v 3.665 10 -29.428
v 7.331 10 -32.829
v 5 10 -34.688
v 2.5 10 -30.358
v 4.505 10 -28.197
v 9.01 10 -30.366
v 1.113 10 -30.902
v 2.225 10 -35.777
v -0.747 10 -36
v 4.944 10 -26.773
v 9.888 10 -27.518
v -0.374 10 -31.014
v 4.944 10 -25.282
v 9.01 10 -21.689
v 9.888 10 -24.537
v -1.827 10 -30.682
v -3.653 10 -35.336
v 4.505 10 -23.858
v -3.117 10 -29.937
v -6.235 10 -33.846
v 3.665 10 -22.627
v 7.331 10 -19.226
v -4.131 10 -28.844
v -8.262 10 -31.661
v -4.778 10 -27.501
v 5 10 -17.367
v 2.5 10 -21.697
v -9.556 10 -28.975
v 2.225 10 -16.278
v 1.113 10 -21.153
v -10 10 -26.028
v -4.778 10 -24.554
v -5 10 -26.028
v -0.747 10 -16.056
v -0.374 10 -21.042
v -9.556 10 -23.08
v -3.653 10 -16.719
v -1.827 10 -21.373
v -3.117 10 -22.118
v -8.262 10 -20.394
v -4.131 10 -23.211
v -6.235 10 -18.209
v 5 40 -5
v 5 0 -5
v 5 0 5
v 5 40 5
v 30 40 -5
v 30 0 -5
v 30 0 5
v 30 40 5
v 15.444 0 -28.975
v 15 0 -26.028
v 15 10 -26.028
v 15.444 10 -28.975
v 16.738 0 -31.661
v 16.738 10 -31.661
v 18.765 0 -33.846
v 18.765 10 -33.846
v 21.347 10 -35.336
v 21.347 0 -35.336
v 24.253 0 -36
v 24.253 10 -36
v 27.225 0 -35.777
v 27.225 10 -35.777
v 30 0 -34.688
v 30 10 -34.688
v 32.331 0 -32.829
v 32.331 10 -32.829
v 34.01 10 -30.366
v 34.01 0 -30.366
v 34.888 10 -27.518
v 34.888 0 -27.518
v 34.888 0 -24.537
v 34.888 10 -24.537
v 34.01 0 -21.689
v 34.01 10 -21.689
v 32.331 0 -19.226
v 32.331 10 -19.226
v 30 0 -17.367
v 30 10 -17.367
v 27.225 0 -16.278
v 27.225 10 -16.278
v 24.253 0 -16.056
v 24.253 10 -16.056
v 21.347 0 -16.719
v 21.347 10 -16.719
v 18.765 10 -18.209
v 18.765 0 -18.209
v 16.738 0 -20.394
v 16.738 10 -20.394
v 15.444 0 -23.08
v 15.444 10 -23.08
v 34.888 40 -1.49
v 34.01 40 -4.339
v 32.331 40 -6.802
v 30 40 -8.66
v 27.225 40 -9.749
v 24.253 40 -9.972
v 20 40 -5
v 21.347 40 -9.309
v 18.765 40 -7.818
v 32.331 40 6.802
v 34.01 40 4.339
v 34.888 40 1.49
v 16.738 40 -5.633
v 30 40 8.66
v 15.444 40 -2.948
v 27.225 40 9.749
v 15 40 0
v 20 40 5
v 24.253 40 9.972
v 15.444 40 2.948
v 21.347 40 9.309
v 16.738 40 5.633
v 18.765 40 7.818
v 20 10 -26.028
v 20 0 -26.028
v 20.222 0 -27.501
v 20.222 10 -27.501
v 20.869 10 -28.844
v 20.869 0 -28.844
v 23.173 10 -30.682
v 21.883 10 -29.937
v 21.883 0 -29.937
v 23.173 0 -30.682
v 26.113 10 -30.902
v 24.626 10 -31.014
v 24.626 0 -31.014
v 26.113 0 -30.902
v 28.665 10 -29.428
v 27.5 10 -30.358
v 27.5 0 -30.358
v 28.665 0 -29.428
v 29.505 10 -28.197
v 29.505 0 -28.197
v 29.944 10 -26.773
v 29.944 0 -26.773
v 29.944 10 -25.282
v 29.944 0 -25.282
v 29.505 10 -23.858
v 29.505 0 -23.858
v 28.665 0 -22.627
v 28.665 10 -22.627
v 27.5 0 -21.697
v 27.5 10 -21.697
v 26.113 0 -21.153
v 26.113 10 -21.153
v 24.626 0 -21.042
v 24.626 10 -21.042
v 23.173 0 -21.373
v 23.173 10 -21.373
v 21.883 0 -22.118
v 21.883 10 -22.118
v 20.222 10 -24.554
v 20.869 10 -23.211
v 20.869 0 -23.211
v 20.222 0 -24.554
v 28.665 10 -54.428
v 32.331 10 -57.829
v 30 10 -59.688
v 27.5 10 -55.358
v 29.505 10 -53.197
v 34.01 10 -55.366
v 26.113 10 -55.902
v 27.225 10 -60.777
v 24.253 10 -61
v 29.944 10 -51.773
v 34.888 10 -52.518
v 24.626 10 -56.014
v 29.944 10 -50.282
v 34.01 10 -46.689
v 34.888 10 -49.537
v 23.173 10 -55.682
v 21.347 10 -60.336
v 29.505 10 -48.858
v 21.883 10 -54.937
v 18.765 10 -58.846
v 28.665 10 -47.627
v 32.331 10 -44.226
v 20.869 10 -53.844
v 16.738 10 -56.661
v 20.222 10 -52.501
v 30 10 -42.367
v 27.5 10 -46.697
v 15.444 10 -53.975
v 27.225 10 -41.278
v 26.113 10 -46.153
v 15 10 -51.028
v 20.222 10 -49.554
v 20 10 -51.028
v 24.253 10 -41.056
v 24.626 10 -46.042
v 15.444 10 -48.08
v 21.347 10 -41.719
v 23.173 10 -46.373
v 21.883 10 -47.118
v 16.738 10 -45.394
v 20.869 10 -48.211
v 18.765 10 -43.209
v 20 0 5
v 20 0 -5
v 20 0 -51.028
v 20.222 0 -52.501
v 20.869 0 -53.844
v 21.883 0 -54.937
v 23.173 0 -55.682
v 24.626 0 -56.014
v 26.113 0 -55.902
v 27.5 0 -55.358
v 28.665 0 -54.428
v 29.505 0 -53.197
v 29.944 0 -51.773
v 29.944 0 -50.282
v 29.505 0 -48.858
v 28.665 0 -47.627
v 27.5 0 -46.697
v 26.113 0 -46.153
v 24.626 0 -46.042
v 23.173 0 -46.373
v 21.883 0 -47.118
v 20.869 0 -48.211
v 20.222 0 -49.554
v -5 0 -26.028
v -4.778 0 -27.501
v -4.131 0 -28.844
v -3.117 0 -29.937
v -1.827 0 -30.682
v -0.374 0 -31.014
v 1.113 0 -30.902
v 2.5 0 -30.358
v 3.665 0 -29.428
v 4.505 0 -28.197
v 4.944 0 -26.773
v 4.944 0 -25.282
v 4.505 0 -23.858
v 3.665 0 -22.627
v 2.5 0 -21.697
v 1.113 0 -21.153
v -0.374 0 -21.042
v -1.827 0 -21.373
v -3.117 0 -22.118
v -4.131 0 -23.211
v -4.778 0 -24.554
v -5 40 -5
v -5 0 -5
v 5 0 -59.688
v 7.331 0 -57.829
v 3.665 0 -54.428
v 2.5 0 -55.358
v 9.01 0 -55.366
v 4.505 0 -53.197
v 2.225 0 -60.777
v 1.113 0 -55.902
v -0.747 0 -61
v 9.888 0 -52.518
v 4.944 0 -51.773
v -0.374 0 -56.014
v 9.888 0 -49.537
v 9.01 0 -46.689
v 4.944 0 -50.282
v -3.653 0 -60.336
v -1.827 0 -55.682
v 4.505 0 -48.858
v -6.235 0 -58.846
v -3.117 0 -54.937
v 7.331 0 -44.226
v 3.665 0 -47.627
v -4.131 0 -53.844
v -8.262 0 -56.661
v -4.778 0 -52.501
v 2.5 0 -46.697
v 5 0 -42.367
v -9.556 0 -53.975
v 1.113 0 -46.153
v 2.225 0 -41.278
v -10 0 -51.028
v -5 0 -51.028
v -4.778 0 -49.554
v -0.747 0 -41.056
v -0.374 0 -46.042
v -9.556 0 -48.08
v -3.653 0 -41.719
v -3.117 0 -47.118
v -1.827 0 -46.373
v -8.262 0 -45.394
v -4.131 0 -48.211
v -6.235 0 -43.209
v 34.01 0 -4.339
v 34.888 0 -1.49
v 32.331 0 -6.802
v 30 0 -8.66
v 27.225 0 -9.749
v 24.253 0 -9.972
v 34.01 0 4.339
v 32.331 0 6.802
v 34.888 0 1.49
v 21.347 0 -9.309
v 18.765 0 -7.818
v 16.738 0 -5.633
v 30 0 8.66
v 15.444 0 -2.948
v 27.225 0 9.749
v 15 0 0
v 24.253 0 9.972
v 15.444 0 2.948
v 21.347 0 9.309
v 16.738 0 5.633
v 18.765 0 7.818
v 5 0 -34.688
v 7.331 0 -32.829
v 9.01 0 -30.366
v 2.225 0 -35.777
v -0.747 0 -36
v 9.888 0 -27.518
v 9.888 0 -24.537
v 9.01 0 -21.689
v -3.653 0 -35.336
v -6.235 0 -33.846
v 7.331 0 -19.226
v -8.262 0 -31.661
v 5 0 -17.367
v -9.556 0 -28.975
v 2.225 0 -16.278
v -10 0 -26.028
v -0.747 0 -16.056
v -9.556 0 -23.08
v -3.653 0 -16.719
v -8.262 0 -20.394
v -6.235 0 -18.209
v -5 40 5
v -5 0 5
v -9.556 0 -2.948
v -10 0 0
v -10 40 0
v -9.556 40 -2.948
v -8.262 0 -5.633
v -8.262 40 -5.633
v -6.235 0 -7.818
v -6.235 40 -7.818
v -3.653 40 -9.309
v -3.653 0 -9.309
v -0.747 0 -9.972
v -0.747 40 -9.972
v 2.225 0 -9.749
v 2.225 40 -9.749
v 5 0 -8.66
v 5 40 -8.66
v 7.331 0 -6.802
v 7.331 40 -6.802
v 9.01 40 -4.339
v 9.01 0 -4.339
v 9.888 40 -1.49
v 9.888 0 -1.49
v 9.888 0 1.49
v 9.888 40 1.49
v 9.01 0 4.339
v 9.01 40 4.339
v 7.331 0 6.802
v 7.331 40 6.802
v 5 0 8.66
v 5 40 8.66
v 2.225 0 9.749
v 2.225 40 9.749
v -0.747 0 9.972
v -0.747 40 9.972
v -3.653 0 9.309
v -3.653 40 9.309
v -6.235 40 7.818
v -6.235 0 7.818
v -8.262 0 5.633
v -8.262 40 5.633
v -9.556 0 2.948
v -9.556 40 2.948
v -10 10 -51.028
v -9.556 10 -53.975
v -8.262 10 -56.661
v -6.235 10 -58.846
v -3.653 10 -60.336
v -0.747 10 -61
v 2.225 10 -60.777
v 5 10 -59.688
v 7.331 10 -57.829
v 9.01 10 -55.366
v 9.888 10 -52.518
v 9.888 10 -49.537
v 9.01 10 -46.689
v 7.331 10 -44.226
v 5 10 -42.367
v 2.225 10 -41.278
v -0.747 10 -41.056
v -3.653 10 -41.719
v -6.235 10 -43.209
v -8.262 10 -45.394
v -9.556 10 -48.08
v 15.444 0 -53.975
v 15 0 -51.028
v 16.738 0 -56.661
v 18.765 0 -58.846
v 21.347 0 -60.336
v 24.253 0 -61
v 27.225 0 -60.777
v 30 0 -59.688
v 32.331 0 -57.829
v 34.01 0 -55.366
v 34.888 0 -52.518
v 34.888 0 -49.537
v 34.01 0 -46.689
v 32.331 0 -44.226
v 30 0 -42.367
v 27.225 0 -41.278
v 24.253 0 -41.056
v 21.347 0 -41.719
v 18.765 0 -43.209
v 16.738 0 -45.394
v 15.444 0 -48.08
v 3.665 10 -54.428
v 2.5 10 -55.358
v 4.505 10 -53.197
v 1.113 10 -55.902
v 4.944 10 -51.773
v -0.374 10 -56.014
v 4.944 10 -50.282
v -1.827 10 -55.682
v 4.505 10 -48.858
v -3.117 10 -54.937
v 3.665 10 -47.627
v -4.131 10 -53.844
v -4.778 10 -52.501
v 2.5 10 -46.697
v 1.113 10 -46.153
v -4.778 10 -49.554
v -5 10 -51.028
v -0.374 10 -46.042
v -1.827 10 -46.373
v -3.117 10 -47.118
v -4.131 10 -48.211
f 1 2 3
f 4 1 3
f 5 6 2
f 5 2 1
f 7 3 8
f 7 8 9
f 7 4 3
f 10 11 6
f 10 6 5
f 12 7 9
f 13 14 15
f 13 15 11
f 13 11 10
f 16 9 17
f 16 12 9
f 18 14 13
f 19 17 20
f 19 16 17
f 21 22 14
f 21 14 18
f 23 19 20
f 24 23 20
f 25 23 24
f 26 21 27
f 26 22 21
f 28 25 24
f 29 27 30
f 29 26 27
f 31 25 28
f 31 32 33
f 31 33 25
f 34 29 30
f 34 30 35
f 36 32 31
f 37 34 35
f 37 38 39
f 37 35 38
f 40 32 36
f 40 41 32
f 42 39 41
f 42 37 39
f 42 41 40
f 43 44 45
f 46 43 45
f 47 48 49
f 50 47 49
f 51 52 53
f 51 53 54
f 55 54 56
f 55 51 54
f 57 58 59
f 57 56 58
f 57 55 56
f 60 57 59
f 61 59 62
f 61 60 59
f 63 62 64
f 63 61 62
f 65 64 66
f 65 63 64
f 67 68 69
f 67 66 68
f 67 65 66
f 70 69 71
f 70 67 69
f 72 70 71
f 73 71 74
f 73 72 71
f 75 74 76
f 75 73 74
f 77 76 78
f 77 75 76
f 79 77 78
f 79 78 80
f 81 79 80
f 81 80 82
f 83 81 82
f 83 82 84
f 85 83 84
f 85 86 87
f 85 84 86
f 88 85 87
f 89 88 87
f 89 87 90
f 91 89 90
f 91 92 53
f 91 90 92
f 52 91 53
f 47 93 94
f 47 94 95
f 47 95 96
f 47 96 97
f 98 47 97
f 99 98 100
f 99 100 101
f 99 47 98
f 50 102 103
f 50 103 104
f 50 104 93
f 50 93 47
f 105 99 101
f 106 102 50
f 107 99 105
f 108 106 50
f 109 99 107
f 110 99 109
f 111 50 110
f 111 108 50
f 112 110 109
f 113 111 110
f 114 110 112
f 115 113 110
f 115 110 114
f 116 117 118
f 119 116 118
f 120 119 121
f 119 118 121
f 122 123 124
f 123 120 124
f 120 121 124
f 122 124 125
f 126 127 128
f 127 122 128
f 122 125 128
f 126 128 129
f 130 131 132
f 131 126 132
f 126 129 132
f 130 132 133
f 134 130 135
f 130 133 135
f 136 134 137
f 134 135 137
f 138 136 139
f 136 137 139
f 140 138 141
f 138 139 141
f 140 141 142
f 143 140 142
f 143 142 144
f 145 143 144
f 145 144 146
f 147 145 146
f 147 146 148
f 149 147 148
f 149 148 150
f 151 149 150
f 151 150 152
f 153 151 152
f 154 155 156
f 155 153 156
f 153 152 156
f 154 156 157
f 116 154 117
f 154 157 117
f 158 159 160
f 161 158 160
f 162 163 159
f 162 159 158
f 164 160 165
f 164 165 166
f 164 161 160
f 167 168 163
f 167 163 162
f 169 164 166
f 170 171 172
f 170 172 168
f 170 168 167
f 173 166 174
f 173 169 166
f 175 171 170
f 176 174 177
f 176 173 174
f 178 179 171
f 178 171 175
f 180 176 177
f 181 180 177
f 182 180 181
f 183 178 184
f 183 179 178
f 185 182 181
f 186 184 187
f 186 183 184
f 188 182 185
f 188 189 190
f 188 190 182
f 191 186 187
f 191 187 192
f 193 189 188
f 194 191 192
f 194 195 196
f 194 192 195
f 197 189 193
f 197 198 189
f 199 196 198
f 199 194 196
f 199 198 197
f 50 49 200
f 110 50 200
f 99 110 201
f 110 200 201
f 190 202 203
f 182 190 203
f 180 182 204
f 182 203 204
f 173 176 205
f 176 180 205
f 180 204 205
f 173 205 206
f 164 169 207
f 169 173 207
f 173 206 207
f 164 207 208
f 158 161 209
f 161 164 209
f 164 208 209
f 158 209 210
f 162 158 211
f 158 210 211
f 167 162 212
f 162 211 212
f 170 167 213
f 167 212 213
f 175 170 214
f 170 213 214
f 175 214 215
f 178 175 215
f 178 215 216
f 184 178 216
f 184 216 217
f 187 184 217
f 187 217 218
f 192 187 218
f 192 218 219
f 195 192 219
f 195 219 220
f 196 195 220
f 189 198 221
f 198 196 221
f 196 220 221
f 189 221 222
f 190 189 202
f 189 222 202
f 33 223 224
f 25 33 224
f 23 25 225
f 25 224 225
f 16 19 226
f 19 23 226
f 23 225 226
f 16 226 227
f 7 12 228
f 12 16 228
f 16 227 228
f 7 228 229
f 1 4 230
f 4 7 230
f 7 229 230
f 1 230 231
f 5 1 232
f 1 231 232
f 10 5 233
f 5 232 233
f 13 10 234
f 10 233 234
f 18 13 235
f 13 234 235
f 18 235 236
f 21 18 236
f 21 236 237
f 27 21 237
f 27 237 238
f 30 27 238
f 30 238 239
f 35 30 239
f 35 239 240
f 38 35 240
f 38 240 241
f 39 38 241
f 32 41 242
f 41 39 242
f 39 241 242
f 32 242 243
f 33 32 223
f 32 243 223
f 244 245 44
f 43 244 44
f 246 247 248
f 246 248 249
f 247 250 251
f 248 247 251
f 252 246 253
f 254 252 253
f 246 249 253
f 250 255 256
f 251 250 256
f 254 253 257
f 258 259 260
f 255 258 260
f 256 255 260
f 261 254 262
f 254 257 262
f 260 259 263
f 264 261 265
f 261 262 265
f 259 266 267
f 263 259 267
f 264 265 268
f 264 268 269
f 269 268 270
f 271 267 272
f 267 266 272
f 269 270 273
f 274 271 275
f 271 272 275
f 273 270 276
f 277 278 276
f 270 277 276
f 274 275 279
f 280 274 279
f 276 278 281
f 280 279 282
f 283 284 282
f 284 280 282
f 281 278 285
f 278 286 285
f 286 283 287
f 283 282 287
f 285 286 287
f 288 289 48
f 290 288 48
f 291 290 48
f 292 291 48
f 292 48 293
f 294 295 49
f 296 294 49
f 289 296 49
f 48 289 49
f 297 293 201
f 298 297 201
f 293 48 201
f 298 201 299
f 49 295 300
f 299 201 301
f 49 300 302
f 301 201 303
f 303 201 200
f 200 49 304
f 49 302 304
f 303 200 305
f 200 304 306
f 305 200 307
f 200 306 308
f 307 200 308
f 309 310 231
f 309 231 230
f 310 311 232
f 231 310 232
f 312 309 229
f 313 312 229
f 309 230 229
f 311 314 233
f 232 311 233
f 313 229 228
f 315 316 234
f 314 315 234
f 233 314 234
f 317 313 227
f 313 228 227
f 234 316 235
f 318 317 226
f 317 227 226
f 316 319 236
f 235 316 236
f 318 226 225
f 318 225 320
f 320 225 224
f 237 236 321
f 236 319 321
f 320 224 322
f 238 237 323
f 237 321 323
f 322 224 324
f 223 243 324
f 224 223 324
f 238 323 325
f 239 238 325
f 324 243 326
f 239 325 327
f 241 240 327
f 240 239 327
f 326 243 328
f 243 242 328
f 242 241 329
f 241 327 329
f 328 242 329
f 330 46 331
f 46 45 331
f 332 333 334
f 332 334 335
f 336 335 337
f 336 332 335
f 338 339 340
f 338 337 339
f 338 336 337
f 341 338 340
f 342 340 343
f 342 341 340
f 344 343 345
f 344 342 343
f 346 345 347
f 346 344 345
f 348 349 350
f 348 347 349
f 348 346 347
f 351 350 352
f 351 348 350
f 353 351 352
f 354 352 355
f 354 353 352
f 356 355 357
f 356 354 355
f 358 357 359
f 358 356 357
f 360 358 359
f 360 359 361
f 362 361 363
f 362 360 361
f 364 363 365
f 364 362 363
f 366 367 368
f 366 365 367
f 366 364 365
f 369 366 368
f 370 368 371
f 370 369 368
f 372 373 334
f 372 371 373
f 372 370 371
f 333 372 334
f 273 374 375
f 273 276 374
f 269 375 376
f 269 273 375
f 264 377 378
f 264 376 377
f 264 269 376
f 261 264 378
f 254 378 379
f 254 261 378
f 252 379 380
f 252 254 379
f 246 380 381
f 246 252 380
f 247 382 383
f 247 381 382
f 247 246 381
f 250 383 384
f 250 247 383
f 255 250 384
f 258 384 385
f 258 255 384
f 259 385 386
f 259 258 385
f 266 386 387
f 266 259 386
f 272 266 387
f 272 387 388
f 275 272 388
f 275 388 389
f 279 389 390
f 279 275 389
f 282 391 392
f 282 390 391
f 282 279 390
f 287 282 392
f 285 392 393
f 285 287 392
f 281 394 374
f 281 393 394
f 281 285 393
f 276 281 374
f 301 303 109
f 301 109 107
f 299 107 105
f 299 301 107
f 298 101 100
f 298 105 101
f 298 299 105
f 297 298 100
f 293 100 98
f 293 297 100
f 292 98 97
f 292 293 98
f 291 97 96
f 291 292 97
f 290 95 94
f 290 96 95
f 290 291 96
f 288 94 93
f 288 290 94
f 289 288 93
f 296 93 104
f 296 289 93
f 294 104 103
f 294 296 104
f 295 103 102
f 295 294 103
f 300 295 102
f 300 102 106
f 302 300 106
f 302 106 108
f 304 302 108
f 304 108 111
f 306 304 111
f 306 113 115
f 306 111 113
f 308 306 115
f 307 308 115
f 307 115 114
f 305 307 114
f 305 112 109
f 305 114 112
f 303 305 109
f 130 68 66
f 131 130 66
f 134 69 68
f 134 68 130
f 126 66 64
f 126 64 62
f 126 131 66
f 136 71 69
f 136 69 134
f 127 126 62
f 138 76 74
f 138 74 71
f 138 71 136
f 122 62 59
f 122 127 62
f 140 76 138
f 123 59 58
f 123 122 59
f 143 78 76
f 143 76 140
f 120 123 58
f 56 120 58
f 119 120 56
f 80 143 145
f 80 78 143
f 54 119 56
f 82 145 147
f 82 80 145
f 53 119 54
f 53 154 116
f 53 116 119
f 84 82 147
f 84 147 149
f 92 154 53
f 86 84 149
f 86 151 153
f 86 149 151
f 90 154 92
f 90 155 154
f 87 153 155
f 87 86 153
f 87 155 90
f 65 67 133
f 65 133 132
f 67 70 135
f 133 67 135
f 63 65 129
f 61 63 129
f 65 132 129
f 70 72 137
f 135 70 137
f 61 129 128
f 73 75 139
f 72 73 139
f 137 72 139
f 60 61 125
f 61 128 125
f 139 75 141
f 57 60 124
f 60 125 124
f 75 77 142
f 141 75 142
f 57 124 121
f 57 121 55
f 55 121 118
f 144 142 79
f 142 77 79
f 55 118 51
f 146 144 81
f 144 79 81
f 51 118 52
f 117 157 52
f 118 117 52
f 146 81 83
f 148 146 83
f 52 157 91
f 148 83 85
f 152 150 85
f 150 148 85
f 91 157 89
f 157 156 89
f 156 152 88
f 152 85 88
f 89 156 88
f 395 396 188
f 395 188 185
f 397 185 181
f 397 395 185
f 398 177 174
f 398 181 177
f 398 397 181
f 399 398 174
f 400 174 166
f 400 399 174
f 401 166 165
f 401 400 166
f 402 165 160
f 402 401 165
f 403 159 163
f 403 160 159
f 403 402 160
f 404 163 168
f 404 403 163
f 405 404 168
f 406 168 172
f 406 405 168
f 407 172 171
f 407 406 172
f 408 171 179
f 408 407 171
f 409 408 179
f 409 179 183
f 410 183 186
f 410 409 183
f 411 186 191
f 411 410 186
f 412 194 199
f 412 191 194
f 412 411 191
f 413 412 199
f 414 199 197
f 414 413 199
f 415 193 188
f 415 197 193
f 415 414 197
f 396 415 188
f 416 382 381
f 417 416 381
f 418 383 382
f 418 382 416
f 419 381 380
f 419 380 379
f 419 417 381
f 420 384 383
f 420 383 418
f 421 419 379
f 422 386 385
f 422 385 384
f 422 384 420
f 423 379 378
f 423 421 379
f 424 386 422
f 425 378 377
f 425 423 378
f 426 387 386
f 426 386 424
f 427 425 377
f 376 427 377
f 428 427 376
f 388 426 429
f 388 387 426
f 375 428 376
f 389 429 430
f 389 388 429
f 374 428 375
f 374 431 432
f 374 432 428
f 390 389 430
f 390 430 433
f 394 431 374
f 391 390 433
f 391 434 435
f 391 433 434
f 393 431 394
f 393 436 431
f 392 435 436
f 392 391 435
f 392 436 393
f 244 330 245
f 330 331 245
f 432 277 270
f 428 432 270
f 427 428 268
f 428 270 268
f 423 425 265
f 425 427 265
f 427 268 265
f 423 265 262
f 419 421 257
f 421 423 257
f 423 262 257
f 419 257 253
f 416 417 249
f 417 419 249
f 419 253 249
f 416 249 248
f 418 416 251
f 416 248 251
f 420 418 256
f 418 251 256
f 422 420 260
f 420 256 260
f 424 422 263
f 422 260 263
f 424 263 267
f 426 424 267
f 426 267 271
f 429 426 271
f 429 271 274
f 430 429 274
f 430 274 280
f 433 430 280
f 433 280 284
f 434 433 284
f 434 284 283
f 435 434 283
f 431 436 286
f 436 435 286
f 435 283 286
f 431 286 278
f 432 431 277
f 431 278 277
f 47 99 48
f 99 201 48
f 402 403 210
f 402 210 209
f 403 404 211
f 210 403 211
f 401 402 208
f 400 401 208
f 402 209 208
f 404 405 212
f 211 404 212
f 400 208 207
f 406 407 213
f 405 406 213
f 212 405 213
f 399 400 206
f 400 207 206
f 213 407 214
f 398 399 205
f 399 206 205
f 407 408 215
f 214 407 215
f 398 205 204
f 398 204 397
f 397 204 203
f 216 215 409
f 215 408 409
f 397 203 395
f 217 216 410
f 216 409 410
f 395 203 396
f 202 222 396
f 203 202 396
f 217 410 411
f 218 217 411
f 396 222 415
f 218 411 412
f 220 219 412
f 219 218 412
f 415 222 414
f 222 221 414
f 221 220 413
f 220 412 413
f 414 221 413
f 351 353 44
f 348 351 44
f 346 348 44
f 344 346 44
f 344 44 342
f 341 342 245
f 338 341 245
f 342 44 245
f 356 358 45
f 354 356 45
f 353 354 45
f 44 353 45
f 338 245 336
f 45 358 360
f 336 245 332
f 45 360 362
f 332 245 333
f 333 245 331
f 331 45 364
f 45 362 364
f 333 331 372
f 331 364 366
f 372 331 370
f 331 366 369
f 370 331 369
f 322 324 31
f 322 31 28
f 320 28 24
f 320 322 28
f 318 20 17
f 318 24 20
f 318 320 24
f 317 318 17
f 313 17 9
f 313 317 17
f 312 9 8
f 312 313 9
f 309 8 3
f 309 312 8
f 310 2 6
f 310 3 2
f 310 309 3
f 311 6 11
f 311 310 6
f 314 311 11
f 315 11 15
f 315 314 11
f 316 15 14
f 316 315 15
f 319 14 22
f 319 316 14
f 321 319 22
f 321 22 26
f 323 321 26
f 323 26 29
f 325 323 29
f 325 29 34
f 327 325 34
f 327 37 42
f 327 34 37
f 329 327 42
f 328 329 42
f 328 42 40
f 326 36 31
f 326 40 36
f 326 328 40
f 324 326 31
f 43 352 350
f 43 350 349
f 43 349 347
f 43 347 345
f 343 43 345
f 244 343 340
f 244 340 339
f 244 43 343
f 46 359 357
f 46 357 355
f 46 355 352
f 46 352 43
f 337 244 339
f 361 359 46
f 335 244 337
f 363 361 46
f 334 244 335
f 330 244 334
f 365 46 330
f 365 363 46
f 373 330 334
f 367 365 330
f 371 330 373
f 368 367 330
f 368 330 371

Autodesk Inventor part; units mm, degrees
ref_plane "YZ Plane" through (0, 0, 0) normal (1, 0, 0) x (0, 1, 0)
ref_plane "XZ Plane" through (0, 0, 0) normal (0, 1, 0) x (-1, 0, 0)
ref_plane "XY Plane" through (0, 0, 0) normal (0, 0, 1) x (1, 0, 0)
sketch "草圖1" plane through (0, 0, 0) normal (0, 1, 0) x (-1, 0, 0)
  circle A0 centre (0, 0) radius 10
  line L0 (5, -5) -> (-5, -5)
  line L1 (-5, -5) -> (-5, 5)
  line L2 (-5, 5) -> (5, 5)
  line L3 (5, 5) -> (5, -5)
  line L4 (5, -5) -> (-5, 5) construction
  line L5 (-5, -5) -> (5, 5) construction
  dimension "d0" = 20
  dimension "d1" = 10
  dimension "d2" = 10
extrude "擠出1" add sketch "草圖1" along normal blind 40
pattern_linear "矩形陣列1" count 2 spacing 25 along (1, 0, 0) of "擠出1"
sketch "草圖2" plane through (0, 0, 0) normal (0, 1, 0) x (-1, 0, 0)
  circle A0 centre (0, -26.0276) radius 10
  circle A1 centre (0, -26.0276) radius 5
  point P0 (0, 0)
  dimension "d8" = 20
  dimension "d9" = 10
extrude "擠出2" add sketch "草圖2" along normal blind 10
pattern_linear "矩形陣列2" count 2 spacing 25 along (0, 0, -1) count 2 spacing 25 along (1, 0, 0) of "擠出2"
properties part number "print1030_2"
